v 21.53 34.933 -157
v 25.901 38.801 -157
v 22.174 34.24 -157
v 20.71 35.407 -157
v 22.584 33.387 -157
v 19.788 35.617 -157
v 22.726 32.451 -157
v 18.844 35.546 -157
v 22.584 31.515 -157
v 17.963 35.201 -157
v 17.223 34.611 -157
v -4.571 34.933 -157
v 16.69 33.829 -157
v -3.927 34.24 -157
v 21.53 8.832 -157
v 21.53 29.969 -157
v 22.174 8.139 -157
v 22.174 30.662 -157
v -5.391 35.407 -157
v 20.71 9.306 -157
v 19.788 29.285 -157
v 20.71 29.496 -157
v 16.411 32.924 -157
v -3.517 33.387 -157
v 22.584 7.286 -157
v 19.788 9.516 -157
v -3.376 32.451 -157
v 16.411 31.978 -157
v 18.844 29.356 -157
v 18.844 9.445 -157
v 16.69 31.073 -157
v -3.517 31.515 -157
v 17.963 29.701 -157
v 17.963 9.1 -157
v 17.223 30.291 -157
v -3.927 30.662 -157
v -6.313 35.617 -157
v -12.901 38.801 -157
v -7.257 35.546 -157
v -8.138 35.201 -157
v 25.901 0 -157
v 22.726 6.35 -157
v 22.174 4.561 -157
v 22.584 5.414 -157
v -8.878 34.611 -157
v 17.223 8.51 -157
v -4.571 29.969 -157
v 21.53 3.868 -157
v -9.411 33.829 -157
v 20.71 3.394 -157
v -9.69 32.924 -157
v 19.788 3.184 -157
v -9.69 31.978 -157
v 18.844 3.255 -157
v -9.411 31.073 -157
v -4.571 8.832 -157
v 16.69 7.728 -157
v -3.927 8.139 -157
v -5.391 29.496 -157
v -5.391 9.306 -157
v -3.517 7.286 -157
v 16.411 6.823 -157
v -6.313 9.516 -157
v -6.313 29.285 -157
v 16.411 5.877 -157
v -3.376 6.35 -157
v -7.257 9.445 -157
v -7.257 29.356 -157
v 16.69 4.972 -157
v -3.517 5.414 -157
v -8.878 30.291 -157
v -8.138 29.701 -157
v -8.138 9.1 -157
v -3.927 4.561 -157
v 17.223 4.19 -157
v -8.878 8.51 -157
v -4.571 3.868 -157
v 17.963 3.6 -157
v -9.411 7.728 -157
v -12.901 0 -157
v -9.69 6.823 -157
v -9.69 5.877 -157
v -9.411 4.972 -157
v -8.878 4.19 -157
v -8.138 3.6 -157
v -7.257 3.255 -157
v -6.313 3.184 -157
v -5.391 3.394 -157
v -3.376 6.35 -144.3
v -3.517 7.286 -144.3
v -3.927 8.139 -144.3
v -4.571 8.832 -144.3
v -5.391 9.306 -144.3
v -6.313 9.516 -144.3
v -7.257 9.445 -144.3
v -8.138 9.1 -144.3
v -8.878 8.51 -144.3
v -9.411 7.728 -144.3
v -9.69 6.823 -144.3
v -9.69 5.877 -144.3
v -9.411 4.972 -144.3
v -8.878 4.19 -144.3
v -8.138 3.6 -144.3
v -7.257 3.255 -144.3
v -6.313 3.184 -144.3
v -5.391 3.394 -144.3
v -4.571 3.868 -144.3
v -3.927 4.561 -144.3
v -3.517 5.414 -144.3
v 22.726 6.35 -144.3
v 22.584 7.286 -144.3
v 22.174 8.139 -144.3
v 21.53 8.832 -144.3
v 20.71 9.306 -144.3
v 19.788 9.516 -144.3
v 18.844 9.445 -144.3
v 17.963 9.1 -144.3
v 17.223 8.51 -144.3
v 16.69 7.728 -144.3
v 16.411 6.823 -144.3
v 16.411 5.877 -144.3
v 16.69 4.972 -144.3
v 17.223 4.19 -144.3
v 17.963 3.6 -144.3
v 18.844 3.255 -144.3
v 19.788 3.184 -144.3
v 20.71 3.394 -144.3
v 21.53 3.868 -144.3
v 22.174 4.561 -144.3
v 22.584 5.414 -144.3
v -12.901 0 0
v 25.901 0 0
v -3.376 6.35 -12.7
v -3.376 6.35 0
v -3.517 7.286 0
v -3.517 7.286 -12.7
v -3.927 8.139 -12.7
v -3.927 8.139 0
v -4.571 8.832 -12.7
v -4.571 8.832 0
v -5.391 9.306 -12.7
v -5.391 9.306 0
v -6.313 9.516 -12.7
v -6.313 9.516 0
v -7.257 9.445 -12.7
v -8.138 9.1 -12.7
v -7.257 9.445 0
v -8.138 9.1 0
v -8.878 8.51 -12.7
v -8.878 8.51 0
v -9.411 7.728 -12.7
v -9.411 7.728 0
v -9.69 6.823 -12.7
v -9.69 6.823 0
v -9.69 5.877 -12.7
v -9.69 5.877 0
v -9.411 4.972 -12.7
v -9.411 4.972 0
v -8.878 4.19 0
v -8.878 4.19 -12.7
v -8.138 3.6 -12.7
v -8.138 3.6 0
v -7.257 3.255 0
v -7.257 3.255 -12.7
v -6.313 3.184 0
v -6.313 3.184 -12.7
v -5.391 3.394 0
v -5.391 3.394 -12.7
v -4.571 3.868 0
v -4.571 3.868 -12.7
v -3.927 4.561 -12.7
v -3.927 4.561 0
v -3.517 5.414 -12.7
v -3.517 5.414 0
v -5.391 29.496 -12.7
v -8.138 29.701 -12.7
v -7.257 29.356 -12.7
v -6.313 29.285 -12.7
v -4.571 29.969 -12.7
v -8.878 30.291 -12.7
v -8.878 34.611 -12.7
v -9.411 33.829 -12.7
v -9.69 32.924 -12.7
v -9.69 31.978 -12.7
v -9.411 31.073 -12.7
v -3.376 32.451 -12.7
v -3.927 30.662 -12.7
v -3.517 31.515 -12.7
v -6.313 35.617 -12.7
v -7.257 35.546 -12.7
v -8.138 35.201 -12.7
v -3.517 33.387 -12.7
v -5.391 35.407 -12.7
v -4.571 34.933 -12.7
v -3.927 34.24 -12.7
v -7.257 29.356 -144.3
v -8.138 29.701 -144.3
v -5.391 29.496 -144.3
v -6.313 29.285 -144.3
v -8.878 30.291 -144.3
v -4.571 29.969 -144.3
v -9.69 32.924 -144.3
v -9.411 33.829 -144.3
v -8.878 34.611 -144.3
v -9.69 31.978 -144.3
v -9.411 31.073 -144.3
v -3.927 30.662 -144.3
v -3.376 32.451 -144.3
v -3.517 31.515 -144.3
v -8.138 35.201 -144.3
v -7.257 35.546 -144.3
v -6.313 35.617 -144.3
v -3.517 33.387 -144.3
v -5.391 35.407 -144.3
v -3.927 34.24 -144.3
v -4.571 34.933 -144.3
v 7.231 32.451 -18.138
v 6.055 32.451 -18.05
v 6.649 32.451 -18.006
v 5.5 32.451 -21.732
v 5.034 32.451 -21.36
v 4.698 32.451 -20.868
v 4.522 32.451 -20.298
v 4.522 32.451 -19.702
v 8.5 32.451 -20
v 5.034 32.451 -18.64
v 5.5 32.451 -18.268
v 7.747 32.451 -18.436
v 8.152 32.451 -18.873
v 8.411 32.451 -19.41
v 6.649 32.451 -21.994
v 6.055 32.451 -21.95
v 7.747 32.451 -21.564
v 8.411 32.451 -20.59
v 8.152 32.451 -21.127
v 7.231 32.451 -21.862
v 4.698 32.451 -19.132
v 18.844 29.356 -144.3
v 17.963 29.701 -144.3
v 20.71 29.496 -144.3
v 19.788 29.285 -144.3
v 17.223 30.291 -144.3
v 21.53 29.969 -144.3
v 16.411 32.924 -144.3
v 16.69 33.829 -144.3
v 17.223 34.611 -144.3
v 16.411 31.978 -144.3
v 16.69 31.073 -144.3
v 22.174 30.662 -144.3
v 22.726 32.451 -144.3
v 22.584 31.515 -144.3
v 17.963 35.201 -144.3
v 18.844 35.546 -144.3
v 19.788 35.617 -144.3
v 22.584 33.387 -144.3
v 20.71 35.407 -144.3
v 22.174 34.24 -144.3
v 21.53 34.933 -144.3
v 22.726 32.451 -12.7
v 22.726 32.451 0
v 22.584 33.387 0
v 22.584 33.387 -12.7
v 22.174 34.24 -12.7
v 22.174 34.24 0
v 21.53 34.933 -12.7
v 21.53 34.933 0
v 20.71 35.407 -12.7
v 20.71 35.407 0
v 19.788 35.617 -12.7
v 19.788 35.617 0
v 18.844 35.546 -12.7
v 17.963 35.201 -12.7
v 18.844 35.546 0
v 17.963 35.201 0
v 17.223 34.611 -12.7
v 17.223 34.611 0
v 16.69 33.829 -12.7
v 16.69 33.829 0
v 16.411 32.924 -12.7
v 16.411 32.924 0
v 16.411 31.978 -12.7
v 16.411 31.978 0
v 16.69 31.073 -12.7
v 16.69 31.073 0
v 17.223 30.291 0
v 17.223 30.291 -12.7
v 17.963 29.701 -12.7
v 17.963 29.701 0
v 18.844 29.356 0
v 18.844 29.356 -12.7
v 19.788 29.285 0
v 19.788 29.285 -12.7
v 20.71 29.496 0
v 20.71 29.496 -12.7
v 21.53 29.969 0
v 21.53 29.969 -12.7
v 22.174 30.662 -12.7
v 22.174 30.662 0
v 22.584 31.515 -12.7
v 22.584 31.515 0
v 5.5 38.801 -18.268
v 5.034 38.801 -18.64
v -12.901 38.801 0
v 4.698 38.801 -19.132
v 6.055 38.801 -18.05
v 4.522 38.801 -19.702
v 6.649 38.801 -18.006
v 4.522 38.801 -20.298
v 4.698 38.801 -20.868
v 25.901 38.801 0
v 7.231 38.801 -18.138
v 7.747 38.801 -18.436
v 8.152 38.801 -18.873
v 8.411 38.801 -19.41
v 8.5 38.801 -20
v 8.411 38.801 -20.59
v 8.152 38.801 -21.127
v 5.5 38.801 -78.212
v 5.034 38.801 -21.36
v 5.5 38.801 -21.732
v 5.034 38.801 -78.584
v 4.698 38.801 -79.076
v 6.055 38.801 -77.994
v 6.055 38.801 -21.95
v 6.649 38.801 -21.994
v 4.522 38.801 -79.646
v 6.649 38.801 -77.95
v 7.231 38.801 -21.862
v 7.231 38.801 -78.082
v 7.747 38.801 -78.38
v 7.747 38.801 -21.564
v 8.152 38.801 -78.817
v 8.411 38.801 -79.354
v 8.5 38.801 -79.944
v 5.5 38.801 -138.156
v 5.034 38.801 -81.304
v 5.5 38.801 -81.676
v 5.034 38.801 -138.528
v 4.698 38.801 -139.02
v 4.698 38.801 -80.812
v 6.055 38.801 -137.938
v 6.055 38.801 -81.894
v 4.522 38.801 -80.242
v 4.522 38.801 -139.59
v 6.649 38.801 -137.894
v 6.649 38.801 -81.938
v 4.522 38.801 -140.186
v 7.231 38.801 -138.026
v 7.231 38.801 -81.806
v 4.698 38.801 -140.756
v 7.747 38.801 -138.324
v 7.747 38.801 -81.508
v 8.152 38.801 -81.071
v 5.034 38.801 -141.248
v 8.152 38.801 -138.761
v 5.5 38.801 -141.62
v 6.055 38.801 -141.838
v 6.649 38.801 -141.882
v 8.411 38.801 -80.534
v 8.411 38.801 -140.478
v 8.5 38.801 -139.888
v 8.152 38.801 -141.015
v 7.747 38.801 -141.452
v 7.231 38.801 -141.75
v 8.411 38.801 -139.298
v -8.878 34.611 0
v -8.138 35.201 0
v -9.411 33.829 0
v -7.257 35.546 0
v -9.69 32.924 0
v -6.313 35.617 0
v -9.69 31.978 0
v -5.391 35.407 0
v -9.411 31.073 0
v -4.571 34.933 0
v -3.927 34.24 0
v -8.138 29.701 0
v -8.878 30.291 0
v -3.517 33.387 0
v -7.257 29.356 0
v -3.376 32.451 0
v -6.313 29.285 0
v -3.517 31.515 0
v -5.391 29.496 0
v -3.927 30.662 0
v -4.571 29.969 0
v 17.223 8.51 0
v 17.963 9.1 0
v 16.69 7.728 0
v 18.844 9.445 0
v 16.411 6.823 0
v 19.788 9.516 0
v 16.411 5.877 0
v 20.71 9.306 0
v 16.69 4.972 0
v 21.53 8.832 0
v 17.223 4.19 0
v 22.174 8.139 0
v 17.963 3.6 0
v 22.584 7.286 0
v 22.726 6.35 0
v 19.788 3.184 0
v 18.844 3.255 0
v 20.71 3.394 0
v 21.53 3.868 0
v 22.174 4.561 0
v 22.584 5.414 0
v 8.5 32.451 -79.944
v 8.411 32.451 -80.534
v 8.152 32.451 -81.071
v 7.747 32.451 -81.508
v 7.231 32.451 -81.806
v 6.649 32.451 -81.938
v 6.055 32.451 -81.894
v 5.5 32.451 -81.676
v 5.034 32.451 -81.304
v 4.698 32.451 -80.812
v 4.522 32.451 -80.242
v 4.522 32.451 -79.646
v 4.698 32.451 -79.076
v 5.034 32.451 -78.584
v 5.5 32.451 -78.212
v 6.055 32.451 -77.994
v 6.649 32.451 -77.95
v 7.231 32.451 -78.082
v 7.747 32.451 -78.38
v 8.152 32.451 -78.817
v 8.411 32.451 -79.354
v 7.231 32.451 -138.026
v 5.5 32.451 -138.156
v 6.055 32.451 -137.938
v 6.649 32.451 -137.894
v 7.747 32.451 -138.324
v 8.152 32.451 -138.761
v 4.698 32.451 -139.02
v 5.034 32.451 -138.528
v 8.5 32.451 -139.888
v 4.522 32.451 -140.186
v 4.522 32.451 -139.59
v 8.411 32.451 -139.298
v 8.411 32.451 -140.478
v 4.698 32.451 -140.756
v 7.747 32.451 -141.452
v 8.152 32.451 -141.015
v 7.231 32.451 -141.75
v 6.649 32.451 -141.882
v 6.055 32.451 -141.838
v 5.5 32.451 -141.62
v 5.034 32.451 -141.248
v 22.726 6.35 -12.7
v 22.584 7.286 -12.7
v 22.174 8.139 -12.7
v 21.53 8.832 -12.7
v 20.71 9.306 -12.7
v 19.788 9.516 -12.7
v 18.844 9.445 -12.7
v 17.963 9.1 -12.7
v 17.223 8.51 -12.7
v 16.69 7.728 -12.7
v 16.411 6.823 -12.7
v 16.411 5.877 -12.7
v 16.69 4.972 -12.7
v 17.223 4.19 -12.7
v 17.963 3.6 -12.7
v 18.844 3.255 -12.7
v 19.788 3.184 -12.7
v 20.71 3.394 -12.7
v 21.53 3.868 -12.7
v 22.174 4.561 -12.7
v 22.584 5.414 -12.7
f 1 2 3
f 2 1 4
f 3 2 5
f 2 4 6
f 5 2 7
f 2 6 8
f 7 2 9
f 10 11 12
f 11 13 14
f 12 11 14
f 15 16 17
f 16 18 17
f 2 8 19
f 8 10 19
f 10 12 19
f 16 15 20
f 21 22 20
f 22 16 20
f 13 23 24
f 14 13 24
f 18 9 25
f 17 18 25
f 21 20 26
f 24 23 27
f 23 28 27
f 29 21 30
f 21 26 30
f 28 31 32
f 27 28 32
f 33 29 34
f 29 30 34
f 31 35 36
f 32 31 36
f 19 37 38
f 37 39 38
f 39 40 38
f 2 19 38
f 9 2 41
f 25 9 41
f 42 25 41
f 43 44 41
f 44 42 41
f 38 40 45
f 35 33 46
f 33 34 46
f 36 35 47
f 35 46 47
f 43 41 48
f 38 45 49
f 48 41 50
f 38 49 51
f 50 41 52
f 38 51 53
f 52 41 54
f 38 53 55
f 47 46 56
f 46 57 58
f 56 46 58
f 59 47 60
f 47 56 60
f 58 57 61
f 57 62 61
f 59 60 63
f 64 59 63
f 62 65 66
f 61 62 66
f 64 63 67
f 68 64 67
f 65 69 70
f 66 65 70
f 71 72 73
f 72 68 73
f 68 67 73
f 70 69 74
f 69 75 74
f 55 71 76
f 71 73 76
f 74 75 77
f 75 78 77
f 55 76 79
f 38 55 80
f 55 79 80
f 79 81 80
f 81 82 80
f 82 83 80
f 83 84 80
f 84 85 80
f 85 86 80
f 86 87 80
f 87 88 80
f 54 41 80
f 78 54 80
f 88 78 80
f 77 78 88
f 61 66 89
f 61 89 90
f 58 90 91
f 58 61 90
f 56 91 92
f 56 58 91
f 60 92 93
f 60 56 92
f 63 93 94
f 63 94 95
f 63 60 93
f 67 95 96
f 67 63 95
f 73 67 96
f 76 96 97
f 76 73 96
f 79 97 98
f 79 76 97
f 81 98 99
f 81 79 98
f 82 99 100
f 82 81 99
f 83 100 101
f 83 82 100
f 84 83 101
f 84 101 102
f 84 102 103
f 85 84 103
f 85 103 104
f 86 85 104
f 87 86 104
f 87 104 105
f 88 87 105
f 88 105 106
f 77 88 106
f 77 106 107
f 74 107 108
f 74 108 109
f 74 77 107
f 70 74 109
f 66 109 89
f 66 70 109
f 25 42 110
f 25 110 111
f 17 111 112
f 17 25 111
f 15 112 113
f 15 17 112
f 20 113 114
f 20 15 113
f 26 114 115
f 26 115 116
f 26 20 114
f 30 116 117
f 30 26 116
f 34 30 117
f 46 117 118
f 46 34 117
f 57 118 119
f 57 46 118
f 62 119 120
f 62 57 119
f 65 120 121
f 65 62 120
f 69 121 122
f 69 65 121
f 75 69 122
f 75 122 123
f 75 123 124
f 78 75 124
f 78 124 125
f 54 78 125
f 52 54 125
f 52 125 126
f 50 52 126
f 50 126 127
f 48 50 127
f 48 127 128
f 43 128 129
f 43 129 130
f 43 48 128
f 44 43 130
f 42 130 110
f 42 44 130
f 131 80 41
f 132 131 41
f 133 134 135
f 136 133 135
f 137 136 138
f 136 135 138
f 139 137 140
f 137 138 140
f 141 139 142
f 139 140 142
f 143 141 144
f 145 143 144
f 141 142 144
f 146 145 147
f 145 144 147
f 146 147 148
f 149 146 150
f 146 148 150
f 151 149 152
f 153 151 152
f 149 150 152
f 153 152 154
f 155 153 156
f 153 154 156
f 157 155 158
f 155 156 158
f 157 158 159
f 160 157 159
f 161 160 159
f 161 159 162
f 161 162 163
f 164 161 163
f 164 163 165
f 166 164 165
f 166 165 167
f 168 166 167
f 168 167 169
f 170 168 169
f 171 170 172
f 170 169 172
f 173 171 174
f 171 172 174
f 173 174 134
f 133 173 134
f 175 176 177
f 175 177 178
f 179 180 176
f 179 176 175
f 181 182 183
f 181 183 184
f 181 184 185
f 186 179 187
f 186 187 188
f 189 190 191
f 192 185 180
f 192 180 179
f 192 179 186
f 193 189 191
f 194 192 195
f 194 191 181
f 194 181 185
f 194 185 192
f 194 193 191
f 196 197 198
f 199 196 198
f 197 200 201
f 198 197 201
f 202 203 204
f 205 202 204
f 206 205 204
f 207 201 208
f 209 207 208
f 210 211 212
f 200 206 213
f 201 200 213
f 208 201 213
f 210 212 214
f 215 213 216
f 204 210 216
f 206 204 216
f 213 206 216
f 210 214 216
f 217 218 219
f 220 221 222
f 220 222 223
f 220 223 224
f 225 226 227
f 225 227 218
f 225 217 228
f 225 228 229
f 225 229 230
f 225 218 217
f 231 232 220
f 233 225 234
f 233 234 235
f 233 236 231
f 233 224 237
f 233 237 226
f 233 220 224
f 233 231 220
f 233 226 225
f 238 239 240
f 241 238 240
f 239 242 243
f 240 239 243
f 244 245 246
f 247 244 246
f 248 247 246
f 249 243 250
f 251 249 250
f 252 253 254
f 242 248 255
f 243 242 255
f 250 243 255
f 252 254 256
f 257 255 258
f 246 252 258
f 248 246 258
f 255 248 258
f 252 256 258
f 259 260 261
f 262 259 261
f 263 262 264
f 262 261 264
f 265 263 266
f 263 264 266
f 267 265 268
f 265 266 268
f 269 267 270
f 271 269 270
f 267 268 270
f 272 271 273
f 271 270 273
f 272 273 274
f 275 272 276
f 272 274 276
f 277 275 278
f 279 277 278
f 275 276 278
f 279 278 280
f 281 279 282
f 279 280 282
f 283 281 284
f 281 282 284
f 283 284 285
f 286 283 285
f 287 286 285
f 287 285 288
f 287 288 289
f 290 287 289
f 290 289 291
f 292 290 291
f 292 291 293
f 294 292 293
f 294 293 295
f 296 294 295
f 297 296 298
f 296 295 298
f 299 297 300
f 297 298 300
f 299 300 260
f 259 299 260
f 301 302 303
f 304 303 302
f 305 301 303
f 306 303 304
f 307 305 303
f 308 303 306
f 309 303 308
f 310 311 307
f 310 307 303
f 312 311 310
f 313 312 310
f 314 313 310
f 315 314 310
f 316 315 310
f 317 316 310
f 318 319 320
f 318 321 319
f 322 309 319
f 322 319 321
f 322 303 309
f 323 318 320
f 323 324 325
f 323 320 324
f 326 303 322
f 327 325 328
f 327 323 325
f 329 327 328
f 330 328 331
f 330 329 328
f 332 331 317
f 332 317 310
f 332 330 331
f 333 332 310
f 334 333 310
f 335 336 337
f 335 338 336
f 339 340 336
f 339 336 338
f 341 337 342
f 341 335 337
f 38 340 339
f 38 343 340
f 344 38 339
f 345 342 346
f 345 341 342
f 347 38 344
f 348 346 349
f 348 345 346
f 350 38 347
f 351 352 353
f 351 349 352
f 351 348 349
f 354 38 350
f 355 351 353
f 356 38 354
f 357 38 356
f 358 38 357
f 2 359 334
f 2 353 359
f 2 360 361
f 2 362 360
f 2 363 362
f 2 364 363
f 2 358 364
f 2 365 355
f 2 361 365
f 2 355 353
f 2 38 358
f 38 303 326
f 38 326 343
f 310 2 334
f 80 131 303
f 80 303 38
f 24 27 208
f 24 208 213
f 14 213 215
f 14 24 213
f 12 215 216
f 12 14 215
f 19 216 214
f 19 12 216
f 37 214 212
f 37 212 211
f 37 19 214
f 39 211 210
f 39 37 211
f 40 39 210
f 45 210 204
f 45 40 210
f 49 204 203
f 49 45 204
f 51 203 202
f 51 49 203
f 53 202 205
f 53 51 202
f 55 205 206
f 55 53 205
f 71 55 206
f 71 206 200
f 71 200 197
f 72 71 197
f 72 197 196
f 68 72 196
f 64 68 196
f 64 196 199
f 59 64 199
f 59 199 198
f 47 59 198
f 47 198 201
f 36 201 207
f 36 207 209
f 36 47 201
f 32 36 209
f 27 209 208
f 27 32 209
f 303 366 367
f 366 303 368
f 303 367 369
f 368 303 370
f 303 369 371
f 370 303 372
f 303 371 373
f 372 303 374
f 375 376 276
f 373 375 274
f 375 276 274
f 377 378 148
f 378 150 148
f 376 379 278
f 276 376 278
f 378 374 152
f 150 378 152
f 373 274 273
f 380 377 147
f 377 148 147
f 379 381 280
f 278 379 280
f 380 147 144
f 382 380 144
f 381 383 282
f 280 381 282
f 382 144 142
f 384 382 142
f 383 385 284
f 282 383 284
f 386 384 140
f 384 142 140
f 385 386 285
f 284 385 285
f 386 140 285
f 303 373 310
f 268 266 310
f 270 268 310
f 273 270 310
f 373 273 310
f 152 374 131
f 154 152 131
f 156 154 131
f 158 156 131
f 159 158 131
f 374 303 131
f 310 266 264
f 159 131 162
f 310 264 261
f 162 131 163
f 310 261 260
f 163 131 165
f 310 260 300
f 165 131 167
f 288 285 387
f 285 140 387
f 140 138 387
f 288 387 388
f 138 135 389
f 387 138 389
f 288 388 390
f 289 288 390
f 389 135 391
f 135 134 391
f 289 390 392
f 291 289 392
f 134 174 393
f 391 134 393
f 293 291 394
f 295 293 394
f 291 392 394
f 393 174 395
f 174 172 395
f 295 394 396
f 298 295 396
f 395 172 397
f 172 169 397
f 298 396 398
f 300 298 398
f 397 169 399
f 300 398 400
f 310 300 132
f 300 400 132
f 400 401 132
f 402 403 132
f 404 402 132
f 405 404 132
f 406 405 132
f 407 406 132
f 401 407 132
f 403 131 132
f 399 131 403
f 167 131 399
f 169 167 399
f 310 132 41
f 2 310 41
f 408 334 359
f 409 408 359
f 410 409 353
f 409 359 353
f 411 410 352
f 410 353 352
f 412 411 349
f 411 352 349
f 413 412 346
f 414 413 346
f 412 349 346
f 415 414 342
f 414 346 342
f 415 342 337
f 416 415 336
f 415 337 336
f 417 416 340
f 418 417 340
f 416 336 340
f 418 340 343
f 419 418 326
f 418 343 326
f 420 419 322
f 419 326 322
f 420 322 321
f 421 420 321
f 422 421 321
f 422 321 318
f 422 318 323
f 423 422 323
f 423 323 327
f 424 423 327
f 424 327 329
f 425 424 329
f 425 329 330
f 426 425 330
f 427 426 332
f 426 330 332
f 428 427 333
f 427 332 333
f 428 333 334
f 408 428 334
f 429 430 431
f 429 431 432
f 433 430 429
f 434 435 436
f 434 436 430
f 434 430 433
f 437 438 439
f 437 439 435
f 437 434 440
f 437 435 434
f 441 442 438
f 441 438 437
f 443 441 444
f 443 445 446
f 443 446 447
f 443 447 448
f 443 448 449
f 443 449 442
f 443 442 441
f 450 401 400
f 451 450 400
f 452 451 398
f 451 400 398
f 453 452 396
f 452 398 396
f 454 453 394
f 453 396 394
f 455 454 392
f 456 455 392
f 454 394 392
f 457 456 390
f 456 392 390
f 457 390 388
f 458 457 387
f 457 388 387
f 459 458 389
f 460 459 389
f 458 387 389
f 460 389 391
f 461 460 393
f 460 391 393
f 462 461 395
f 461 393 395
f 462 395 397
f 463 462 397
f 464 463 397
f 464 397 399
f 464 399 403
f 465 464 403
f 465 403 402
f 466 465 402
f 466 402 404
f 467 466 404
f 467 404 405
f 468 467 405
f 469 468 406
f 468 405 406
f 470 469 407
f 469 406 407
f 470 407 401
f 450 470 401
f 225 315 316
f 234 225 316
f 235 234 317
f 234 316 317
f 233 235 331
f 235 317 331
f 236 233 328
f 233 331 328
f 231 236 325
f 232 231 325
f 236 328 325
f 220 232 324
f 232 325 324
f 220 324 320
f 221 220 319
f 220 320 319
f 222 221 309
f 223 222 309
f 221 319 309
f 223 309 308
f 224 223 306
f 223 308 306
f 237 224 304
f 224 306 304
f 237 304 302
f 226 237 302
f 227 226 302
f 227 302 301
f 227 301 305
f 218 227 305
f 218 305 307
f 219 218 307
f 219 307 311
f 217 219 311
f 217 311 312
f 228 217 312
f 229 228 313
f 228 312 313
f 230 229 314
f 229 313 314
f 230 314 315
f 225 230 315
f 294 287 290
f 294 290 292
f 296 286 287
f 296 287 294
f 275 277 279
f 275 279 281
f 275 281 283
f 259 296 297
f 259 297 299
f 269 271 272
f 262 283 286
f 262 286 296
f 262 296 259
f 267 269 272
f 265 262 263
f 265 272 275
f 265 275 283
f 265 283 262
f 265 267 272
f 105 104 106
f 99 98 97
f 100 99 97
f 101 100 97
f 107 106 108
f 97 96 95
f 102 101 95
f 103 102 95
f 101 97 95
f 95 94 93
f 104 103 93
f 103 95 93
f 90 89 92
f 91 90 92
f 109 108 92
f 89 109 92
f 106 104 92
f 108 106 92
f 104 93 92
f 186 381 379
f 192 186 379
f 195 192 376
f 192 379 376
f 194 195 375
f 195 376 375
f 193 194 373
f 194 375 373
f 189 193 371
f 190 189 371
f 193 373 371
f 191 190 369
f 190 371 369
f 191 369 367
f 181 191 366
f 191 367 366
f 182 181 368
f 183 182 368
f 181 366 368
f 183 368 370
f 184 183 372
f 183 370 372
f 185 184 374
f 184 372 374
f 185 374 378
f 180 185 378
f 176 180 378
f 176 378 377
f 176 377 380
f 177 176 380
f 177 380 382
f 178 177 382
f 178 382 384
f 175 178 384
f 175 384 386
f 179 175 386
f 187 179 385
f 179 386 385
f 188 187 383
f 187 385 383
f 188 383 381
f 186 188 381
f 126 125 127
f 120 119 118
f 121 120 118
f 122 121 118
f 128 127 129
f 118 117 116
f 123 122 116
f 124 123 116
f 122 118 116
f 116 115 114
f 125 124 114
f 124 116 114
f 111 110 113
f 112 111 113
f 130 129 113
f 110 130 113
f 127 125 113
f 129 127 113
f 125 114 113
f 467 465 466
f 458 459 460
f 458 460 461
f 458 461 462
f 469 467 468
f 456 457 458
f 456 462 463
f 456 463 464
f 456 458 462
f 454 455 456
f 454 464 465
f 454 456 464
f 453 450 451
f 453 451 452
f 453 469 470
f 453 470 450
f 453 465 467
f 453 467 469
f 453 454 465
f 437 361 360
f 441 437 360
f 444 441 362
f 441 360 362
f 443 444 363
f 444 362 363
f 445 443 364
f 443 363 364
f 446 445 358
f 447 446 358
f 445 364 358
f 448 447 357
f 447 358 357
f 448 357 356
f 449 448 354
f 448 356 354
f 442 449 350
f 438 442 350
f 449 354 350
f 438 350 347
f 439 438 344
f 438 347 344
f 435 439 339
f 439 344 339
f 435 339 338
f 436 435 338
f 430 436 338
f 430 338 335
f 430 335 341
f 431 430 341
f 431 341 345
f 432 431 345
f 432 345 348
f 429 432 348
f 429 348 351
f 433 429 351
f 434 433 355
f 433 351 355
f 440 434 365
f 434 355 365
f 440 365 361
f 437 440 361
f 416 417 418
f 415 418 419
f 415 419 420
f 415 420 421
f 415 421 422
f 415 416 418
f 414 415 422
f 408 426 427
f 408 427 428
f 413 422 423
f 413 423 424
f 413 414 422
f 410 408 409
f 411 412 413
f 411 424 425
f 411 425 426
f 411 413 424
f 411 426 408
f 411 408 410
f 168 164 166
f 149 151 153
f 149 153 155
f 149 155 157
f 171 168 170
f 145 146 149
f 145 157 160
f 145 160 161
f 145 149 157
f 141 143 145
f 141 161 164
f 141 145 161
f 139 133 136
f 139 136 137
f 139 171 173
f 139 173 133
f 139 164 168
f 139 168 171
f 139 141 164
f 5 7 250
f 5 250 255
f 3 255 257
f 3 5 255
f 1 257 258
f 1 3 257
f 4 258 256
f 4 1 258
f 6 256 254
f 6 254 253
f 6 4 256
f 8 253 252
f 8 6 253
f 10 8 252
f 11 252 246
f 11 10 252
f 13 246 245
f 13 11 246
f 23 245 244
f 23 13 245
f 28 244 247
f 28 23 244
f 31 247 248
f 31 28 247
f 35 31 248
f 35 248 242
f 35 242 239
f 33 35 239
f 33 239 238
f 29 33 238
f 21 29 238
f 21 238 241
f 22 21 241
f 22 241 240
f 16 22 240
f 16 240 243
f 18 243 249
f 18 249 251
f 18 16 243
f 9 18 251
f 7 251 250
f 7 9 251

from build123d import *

# Parameters (mm, degrees)
SKETCH1_W           = 12.90052
SKETCH1_H           = 156.99994
SKETCH1_W_2         = 13
SKETCH1_R           = 2
BOSS_EXTRUDE1_DEPTH = 38.80104
CUT_EXTRUDE1_START  = 38.80104
SKETCH1_3_R         = 2
CUT_EXTRUDE1_DEPTH  = 6.35
SKETCH2_R           = 3.175
CUT_EXTRUDE2_DEPTH  = 12.7
CUT_EXTRUDE3_START  = -156.99994
SKETCH2_3_R         = 3.175
CUT_EXTRUDE3_DEPTH  = 12.7


with BuildPart() as part:
    # Sketch1 → Boss-Extrude1 (new body)
    with BuildSketch(Plane(origin=(0, 0, 0), x_dir=(1, 0, 0), z_dir=(0, 1, 0))):
        with Locations((-6.45026, 78.49997)):
            Rectangle(SKETCH1_W, SKETCH1_H)
        with Locations((6.5, 78.49997)):
            Rectangle(SKETCH1_W_2, SKETCH1_H)
        with Locations((6.5, 20)):
            Circle(SKETCH1_R, mode=Mode.SUBTRACT)
        with Locations((6.5, 79.944)):
            Circle(SKETCH1_R, mode=Mode.SUBTRACT)
        with Locations((6.5, 139.888)):
            Circle(SKETCH1_R, mode=Mode.SUBTRACT)
        with Locations((19.45026, 78.49997)):
            Rectangle(SKETCH1_W, SKETCH1_H)
        with Locations((6.5, 20)):
            Circle(SKETCH1_R)
        with Locations((6.5, 139.888)):
            Circle(SKETCH1_R)
        with Locations((6.5, 79.944)):
            Circle(SKETCH1_R)
    extrude(amount=BOSS_EXTRUDE1_DEPTH)

    # Sketch1<3> → Cut-Extrude1 (cut)
    with BuildSketch(Plane(origin=(0, 0, 0), x_dir=(1, 0, 0), z_dir=(0, 1, 0)).offset(CUT_EXTRUDE1_START)):
        with Locations((6.5, 20)):
            Circle(SKETCH1_3_R)
        with Locations((6.5, 79.944)):
            Circle(SKETCH1_3_R)
        with Locations((6.5, 139.888)):
            Circle(SKETCH1_3_R)
    extrude(amount=-CUT_EXTRUDE1_DEPTH, mode=Mode.SUBTRACT)

    # Sketch2 → Cut-Extrude2 (cut)
    with BuildSketch(Plane.XY):
        with Locations((-6.55052, 32.45104)):
            Circle(SKETCH2_R)
        with Locations((19.55052, 32.45104)):
            Circle(SKETCH2_R)
        with Locations((19.55052, 6.35)):
            Circle(SKETCH2_R)
        with Locations((-6.55052, 6.35)):
            Circle(SKETCH2_R)
    extrude(amount=-CUT_EXTRUDE2_DEPTH, mode=Mode.SUBTRACT)

    # Sketch2<3> → Cut-Extrude3 (cut)
    with BuildSketch(Plane.XY.offset(CUT_EXTRUDE3_START)):
        with Locations((-6.55052, 32.45104)):
            Circle(SKETCH2_3_R)
        with Locations((19.55052, 32.45104)):
            Circle(SKETCH2_3_R)
        with Locations((19.55052, 6.35)):
            Circle(SKETCH2_3_R)
        with Locations((-6.55052, 6.35)):
            Circle(SKETCH2_3_R)
    extrude(amount=CUT_EXTRUDE3_DEPTH, mode=Mode.SUBTRACT)


solid = part.part
